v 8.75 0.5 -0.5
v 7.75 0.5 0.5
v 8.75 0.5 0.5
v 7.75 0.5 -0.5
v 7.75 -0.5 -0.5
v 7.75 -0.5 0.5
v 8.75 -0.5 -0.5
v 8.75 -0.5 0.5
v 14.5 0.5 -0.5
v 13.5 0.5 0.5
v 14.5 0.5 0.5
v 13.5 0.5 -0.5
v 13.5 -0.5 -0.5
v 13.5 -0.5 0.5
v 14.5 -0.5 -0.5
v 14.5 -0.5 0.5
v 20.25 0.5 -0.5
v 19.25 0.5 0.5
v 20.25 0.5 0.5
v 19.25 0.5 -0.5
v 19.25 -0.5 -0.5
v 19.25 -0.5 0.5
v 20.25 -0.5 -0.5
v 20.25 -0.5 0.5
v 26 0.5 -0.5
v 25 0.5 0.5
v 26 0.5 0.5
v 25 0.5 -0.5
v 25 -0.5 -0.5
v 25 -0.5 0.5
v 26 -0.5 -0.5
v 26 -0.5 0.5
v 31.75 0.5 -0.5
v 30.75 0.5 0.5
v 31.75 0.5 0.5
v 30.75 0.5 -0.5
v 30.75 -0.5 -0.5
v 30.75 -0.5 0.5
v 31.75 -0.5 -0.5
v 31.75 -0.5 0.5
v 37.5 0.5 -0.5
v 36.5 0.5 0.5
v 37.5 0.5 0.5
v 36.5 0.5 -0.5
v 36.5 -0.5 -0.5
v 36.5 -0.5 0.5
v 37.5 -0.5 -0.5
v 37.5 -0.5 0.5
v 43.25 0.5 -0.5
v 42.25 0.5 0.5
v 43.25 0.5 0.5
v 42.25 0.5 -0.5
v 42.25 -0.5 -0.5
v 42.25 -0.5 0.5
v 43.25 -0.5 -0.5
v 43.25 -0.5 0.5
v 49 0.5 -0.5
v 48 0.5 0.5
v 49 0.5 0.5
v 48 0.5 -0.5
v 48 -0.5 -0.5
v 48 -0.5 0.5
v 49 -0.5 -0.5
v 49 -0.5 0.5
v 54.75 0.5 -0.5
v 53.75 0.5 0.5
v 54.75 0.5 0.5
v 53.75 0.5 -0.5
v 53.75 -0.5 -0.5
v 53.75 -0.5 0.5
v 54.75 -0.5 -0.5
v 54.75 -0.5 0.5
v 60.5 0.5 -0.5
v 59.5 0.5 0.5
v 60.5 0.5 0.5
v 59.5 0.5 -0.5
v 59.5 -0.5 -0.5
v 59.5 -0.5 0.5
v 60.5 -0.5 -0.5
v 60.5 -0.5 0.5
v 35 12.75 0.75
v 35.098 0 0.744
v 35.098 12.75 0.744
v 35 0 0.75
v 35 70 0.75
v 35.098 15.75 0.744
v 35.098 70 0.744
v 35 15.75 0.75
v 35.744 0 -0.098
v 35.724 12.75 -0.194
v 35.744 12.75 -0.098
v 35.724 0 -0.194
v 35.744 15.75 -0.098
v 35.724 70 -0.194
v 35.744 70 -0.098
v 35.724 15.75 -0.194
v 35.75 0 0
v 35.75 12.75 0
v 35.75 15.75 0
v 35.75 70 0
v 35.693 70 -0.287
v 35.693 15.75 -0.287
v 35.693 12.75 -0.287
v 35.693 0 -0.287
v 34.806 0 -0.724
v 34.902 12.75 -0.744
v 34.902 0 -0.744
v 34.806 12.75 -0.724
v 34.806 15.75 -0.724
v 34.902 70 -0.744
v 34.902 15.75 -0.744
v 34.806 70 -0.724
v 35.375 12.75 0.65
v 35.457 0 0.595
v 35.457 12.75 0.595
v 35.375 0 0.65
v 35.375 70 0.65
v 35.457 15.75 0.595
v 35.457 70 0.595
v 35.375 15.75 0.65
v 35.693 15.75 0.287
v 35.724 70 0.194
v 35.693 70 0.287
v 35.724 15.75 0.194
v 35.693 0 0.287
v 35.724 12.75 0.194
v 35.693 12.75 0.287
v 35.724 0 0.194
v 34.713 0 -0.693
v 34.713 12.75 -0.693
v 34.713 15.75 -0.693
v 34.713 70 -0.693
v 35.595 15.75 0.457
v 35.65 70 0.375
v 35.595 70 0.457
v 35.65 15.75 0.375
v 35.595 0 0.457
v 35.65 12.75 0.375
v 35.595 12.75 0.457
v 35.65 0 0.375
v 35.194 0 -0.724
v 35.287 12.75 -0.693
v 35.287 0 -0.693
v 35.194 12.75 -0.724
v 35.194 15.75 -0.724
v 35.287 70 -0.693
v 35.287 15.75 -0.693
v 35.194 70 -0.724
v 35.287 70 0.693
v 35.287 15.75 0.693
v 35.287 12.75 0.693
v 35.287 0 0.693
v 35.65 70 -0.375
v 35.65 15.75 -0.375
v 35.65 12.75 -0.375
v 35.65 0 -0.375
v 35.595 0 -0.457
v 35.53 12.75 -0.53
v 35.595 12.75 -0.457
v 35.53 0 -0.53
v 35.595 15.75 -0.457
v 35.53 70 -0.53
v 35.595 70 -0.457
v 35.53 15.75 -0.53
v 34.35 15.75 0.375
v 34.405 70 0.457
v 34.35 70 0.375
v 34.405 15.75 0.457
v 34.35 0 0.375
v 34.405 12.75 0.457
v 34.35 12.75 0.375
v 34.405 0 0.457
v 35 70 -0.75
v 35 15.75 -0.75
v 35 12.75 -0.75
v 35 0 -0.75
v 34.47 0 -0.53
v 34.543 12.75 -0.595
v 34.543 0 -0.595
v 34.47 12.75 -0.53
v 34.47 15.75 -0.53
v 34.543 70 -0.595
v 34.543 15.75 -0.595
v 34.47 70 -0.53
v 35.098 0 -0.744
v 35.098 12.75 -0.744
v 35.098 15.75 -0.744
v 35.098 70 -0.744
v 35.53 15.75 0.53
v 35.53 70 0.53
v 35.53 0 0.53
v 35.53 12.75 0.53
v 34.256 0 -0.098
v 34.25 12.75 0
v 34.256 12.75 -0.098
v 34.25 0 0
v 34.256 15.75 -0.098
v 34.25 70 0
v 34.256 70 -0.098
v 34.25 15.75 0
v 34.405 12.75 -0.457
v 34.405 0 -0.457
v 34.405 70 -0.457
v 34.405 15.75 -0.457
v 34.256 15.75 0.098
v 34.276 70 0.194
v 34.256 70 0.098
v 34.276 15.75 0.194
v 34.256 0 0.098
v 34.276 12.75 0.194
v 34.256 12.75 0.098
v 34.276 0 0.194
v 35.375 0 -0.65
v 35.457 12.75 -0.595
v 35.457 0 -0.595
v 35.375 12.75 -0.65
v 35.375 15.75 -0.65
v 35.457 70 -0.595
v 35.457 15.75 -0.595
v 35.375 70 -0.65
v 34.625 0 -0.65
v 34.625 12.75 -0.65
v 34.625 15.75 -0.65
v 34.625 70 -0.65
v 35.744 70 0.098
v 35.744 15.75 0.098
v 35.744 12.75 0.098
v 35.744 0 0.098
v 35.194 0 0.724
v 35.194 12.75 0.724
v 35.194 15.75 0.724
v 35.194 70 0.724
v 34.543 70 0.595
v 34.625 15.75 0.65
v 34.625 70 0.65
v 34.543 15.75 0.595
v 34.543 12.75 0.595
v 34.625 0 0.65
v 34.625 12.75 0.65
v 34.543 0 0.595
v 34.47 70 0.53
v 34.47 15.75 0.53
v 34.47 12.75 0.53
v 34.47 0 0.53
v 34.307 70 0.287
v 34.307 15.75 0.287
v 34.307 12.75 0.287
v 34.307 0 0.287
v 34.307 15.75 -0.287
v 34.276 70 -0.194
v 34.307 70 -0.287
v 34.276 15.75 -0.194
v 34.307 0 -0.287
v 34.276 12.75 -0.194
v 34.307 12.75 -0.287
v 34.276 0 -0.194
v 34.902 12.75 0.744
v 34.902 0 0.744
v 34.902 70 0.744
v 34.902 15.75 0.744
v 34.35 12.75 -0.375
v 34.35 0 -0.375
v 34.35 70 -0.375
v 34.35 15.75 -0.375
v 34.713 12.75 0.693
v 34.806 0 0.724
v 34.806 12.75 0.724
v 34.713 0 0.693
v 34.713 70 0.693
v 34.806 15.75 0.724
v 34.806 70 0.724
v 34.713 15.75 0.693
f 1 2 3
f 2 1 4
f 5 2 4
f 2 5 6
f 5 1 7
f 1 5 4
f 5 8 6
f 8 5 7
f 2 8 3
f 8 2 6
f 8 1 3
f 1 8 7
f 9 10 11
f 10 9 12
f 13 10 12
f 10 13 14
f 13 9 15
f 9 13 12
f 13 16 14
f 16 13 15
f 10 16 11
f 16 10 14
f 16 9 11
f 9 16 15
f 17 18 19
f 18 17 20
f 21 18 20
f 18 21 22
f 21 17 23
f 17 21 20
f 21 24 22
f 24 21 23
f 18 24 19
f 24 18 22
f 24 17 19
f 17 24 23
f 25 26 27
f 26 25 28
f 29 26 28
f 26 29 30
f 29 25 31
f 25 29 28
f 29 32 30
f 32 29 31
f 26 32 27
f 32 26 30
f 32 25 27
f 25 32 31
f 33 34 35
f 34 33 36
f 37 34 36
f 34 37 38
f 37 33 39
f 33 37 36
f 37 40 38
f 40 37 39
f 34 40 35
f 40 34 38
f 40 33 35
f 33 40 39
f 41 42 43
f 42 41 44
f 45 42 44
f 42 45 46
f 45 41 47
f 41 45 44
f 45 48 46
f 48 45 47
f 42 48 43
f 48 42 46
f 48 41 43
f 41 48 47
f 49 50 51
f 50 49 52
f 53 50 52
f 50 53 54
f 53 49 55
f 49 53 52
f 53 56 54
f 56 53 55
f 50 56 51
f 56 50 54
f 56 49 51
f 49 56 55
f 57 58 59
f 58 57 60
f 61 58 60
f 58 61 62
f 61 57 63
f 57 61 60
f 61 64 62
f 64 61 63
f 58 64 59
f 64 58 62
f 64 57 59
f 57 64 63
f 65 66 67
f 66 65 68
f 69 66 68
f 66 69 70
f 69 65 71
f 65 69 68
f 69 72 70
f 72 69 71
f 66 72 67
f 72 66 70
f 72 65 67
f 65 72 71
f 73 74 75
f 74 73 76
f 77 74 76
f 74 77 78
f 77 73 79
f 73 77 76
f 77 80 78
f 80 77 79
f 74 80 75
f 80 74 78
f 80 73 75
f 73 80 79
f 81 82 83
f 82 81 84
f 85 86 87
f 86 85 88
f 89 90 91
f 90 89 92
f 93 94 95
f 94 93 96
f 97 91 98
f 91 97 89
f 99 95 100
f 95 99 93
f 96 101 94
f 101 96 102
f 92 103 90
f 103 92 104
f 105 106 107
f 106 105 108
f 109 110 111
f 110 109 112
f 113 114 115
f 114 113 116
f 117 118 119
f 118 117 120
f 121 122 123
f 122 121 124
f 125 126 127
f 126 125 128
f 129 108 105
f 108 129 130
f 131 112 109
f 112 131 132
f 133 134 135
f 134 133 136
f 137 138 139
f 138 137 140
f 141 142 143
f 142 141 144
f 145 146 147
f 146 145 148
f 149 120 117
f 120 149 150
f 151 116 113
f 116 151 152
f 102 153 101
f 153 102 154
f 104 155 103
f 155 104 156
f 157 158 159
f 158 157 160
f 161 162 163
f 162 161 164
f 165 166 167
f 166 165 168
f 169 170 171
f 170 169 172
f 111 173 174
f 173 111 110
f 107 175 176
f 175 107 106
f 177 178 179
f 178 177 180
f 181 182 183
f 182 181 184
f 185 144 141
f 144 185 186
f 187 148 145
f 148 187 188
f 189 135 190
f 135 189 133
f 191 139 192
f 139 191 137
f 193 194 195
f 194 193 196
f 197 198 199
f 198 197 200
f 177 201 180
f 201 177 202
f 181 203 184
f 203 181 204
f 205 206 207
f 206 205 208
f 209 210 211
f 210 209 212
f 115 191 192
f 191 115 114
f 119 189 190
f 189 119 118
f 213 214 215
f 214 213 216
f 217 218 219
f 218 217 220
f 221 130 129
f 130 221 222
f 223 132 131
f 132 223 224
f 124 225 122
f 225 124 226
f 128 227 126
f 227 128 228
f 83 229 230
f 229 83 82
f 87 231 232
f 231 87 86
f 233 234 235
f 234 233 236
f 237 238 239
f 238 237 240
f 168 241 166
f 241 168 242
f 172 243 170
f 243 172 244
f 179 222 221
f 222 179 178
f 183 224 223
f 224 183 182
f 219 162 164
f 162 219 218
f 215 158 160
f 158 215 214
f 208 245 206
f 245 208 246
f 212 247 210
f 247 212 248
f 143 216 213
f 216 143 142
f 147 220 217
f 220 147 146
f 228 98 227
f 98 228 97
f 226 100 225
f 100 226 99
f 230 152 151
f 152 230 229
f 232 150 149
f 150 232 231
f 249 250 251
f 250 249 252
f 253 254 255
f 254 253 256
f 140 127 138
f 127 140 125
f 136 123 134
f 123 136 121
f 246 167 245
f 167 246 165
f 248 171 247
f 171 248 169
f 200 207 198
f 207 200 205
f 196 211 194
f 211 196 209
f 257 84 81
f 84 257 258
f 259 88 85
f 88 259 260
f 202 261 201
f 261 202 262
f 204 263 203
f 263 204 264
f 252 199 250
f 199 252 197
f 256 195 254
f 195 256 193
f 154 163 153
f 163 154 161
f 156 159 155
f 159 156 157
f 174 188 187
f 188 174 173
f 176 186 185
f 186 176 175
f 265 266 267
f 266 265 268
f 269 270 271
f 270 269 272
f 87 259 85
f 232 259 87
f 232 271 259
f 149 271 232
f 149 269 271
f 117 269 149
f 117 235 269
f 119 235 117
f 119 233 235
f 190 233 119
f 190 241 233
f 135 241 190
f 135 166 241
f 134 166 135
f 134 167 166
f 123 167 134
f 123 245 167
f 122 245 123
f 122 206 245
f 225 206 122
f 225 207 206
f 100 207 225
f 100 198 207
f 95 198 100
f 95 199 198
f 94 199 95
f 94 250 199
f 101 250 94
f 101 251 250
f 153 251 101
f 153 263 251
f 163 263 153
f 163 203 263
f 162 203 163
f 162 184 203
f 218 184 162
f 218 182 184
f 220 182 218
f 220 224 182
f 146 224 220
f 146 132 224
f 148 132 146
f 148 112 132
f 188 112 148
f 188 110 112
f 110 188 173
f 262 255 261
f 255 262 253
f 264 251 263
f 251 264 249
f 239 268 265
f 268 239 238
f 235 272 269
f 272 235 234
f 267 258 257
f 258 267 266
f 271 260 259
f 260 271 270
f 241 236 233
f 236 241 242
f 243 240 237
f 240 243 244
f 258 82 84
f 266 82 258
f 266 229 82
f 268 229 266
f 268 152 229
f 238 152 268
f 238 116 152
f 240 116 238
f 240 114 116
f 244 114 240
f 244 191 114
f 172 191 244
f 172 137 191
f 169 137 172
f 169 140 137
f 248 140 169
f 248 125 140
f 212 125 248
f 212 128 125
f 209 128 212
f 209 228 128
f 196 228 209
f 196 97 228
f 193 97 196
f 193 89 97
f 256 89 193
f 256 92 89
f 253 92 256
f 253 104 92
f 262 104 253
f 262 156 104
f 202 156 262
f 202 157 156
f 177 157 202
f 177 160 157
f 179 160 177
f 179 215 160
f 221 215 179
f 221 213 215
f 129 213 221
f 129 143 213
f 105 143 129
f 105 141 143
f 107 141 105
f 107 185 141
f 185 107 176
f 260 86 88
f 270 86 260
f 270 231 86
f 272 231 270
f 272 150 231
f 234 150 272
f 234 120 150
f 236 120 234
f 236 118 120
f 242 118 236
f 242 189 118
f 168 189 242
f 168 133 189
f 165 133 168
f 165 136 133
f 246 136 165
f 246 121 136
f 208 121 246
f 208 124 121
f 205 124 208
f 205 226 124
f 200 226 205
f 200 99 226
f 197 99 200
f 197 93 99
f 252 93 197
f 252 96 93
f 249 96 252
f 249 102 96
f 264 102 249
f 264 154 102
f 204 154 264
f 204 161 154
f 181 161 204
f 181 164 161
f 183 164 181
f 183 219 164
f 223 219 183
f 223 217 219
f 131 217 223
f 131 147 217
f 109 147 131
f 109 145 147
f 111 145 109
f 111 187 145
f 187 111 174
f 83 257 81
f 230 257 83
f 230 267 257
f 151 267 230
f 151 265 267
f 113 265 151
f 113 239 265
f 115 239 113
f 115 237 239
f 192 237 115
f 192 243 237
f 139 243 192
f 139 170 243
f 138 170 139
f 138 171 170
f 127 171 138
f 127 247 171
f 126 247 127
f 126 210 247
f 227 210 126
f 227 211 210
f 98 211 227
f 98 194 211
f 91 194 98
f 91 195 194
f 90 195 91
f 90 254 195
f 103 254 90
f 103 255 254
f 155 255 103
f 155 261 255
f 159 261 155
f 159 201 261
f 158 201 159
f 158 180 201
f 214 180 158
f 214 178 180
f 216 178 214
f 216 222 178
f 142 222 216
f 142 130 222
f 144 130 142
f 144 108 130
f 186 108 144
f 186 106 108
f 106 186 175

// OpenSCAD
// Agarose gel comb - a flat plate with a back bar and a row of rectangular teeth for casting
// horizontal gels. NOVEL general part, printed lying flat on the bed.
//

teeth = 10;
bar   = 70;
t     = 1.5;
g     = 1.5;
w     = 5;
l     = 12;

$fn = 48;

teeth_size = [w, l];
gap         = [g, 0];
base        = [bar, l + 1.5];                 // the back bar (spine)
projection  = [w + g, l];                     // one tooth plus its following gap

difference() {
    union() {
        translate([bar / 2, 0, 0]) rotate([-90, 0, 0]) cylinder(h = bar, d = t);           // back bar (spine)
        for (i = [0 : teeth - 1])
            translate([bar / 2 - (w + g) * teeth / 2 + (w + g / 2) * (i + 1), 0, 0])
                rotate([-90, 0, 0]) cube([w + g, l], center = true);                         // teeth
    }
    for (i = [0 : teeth - 1])
        translate([bar / 2 - (w + g) * teeth / 2 + (w + g / 2) * (i + 1), l + 0.75, 0])
            rotate([-90, 0, 0]) cylinder(h = t + 1.5, d = w + g);                           // empty below each tooth
}
